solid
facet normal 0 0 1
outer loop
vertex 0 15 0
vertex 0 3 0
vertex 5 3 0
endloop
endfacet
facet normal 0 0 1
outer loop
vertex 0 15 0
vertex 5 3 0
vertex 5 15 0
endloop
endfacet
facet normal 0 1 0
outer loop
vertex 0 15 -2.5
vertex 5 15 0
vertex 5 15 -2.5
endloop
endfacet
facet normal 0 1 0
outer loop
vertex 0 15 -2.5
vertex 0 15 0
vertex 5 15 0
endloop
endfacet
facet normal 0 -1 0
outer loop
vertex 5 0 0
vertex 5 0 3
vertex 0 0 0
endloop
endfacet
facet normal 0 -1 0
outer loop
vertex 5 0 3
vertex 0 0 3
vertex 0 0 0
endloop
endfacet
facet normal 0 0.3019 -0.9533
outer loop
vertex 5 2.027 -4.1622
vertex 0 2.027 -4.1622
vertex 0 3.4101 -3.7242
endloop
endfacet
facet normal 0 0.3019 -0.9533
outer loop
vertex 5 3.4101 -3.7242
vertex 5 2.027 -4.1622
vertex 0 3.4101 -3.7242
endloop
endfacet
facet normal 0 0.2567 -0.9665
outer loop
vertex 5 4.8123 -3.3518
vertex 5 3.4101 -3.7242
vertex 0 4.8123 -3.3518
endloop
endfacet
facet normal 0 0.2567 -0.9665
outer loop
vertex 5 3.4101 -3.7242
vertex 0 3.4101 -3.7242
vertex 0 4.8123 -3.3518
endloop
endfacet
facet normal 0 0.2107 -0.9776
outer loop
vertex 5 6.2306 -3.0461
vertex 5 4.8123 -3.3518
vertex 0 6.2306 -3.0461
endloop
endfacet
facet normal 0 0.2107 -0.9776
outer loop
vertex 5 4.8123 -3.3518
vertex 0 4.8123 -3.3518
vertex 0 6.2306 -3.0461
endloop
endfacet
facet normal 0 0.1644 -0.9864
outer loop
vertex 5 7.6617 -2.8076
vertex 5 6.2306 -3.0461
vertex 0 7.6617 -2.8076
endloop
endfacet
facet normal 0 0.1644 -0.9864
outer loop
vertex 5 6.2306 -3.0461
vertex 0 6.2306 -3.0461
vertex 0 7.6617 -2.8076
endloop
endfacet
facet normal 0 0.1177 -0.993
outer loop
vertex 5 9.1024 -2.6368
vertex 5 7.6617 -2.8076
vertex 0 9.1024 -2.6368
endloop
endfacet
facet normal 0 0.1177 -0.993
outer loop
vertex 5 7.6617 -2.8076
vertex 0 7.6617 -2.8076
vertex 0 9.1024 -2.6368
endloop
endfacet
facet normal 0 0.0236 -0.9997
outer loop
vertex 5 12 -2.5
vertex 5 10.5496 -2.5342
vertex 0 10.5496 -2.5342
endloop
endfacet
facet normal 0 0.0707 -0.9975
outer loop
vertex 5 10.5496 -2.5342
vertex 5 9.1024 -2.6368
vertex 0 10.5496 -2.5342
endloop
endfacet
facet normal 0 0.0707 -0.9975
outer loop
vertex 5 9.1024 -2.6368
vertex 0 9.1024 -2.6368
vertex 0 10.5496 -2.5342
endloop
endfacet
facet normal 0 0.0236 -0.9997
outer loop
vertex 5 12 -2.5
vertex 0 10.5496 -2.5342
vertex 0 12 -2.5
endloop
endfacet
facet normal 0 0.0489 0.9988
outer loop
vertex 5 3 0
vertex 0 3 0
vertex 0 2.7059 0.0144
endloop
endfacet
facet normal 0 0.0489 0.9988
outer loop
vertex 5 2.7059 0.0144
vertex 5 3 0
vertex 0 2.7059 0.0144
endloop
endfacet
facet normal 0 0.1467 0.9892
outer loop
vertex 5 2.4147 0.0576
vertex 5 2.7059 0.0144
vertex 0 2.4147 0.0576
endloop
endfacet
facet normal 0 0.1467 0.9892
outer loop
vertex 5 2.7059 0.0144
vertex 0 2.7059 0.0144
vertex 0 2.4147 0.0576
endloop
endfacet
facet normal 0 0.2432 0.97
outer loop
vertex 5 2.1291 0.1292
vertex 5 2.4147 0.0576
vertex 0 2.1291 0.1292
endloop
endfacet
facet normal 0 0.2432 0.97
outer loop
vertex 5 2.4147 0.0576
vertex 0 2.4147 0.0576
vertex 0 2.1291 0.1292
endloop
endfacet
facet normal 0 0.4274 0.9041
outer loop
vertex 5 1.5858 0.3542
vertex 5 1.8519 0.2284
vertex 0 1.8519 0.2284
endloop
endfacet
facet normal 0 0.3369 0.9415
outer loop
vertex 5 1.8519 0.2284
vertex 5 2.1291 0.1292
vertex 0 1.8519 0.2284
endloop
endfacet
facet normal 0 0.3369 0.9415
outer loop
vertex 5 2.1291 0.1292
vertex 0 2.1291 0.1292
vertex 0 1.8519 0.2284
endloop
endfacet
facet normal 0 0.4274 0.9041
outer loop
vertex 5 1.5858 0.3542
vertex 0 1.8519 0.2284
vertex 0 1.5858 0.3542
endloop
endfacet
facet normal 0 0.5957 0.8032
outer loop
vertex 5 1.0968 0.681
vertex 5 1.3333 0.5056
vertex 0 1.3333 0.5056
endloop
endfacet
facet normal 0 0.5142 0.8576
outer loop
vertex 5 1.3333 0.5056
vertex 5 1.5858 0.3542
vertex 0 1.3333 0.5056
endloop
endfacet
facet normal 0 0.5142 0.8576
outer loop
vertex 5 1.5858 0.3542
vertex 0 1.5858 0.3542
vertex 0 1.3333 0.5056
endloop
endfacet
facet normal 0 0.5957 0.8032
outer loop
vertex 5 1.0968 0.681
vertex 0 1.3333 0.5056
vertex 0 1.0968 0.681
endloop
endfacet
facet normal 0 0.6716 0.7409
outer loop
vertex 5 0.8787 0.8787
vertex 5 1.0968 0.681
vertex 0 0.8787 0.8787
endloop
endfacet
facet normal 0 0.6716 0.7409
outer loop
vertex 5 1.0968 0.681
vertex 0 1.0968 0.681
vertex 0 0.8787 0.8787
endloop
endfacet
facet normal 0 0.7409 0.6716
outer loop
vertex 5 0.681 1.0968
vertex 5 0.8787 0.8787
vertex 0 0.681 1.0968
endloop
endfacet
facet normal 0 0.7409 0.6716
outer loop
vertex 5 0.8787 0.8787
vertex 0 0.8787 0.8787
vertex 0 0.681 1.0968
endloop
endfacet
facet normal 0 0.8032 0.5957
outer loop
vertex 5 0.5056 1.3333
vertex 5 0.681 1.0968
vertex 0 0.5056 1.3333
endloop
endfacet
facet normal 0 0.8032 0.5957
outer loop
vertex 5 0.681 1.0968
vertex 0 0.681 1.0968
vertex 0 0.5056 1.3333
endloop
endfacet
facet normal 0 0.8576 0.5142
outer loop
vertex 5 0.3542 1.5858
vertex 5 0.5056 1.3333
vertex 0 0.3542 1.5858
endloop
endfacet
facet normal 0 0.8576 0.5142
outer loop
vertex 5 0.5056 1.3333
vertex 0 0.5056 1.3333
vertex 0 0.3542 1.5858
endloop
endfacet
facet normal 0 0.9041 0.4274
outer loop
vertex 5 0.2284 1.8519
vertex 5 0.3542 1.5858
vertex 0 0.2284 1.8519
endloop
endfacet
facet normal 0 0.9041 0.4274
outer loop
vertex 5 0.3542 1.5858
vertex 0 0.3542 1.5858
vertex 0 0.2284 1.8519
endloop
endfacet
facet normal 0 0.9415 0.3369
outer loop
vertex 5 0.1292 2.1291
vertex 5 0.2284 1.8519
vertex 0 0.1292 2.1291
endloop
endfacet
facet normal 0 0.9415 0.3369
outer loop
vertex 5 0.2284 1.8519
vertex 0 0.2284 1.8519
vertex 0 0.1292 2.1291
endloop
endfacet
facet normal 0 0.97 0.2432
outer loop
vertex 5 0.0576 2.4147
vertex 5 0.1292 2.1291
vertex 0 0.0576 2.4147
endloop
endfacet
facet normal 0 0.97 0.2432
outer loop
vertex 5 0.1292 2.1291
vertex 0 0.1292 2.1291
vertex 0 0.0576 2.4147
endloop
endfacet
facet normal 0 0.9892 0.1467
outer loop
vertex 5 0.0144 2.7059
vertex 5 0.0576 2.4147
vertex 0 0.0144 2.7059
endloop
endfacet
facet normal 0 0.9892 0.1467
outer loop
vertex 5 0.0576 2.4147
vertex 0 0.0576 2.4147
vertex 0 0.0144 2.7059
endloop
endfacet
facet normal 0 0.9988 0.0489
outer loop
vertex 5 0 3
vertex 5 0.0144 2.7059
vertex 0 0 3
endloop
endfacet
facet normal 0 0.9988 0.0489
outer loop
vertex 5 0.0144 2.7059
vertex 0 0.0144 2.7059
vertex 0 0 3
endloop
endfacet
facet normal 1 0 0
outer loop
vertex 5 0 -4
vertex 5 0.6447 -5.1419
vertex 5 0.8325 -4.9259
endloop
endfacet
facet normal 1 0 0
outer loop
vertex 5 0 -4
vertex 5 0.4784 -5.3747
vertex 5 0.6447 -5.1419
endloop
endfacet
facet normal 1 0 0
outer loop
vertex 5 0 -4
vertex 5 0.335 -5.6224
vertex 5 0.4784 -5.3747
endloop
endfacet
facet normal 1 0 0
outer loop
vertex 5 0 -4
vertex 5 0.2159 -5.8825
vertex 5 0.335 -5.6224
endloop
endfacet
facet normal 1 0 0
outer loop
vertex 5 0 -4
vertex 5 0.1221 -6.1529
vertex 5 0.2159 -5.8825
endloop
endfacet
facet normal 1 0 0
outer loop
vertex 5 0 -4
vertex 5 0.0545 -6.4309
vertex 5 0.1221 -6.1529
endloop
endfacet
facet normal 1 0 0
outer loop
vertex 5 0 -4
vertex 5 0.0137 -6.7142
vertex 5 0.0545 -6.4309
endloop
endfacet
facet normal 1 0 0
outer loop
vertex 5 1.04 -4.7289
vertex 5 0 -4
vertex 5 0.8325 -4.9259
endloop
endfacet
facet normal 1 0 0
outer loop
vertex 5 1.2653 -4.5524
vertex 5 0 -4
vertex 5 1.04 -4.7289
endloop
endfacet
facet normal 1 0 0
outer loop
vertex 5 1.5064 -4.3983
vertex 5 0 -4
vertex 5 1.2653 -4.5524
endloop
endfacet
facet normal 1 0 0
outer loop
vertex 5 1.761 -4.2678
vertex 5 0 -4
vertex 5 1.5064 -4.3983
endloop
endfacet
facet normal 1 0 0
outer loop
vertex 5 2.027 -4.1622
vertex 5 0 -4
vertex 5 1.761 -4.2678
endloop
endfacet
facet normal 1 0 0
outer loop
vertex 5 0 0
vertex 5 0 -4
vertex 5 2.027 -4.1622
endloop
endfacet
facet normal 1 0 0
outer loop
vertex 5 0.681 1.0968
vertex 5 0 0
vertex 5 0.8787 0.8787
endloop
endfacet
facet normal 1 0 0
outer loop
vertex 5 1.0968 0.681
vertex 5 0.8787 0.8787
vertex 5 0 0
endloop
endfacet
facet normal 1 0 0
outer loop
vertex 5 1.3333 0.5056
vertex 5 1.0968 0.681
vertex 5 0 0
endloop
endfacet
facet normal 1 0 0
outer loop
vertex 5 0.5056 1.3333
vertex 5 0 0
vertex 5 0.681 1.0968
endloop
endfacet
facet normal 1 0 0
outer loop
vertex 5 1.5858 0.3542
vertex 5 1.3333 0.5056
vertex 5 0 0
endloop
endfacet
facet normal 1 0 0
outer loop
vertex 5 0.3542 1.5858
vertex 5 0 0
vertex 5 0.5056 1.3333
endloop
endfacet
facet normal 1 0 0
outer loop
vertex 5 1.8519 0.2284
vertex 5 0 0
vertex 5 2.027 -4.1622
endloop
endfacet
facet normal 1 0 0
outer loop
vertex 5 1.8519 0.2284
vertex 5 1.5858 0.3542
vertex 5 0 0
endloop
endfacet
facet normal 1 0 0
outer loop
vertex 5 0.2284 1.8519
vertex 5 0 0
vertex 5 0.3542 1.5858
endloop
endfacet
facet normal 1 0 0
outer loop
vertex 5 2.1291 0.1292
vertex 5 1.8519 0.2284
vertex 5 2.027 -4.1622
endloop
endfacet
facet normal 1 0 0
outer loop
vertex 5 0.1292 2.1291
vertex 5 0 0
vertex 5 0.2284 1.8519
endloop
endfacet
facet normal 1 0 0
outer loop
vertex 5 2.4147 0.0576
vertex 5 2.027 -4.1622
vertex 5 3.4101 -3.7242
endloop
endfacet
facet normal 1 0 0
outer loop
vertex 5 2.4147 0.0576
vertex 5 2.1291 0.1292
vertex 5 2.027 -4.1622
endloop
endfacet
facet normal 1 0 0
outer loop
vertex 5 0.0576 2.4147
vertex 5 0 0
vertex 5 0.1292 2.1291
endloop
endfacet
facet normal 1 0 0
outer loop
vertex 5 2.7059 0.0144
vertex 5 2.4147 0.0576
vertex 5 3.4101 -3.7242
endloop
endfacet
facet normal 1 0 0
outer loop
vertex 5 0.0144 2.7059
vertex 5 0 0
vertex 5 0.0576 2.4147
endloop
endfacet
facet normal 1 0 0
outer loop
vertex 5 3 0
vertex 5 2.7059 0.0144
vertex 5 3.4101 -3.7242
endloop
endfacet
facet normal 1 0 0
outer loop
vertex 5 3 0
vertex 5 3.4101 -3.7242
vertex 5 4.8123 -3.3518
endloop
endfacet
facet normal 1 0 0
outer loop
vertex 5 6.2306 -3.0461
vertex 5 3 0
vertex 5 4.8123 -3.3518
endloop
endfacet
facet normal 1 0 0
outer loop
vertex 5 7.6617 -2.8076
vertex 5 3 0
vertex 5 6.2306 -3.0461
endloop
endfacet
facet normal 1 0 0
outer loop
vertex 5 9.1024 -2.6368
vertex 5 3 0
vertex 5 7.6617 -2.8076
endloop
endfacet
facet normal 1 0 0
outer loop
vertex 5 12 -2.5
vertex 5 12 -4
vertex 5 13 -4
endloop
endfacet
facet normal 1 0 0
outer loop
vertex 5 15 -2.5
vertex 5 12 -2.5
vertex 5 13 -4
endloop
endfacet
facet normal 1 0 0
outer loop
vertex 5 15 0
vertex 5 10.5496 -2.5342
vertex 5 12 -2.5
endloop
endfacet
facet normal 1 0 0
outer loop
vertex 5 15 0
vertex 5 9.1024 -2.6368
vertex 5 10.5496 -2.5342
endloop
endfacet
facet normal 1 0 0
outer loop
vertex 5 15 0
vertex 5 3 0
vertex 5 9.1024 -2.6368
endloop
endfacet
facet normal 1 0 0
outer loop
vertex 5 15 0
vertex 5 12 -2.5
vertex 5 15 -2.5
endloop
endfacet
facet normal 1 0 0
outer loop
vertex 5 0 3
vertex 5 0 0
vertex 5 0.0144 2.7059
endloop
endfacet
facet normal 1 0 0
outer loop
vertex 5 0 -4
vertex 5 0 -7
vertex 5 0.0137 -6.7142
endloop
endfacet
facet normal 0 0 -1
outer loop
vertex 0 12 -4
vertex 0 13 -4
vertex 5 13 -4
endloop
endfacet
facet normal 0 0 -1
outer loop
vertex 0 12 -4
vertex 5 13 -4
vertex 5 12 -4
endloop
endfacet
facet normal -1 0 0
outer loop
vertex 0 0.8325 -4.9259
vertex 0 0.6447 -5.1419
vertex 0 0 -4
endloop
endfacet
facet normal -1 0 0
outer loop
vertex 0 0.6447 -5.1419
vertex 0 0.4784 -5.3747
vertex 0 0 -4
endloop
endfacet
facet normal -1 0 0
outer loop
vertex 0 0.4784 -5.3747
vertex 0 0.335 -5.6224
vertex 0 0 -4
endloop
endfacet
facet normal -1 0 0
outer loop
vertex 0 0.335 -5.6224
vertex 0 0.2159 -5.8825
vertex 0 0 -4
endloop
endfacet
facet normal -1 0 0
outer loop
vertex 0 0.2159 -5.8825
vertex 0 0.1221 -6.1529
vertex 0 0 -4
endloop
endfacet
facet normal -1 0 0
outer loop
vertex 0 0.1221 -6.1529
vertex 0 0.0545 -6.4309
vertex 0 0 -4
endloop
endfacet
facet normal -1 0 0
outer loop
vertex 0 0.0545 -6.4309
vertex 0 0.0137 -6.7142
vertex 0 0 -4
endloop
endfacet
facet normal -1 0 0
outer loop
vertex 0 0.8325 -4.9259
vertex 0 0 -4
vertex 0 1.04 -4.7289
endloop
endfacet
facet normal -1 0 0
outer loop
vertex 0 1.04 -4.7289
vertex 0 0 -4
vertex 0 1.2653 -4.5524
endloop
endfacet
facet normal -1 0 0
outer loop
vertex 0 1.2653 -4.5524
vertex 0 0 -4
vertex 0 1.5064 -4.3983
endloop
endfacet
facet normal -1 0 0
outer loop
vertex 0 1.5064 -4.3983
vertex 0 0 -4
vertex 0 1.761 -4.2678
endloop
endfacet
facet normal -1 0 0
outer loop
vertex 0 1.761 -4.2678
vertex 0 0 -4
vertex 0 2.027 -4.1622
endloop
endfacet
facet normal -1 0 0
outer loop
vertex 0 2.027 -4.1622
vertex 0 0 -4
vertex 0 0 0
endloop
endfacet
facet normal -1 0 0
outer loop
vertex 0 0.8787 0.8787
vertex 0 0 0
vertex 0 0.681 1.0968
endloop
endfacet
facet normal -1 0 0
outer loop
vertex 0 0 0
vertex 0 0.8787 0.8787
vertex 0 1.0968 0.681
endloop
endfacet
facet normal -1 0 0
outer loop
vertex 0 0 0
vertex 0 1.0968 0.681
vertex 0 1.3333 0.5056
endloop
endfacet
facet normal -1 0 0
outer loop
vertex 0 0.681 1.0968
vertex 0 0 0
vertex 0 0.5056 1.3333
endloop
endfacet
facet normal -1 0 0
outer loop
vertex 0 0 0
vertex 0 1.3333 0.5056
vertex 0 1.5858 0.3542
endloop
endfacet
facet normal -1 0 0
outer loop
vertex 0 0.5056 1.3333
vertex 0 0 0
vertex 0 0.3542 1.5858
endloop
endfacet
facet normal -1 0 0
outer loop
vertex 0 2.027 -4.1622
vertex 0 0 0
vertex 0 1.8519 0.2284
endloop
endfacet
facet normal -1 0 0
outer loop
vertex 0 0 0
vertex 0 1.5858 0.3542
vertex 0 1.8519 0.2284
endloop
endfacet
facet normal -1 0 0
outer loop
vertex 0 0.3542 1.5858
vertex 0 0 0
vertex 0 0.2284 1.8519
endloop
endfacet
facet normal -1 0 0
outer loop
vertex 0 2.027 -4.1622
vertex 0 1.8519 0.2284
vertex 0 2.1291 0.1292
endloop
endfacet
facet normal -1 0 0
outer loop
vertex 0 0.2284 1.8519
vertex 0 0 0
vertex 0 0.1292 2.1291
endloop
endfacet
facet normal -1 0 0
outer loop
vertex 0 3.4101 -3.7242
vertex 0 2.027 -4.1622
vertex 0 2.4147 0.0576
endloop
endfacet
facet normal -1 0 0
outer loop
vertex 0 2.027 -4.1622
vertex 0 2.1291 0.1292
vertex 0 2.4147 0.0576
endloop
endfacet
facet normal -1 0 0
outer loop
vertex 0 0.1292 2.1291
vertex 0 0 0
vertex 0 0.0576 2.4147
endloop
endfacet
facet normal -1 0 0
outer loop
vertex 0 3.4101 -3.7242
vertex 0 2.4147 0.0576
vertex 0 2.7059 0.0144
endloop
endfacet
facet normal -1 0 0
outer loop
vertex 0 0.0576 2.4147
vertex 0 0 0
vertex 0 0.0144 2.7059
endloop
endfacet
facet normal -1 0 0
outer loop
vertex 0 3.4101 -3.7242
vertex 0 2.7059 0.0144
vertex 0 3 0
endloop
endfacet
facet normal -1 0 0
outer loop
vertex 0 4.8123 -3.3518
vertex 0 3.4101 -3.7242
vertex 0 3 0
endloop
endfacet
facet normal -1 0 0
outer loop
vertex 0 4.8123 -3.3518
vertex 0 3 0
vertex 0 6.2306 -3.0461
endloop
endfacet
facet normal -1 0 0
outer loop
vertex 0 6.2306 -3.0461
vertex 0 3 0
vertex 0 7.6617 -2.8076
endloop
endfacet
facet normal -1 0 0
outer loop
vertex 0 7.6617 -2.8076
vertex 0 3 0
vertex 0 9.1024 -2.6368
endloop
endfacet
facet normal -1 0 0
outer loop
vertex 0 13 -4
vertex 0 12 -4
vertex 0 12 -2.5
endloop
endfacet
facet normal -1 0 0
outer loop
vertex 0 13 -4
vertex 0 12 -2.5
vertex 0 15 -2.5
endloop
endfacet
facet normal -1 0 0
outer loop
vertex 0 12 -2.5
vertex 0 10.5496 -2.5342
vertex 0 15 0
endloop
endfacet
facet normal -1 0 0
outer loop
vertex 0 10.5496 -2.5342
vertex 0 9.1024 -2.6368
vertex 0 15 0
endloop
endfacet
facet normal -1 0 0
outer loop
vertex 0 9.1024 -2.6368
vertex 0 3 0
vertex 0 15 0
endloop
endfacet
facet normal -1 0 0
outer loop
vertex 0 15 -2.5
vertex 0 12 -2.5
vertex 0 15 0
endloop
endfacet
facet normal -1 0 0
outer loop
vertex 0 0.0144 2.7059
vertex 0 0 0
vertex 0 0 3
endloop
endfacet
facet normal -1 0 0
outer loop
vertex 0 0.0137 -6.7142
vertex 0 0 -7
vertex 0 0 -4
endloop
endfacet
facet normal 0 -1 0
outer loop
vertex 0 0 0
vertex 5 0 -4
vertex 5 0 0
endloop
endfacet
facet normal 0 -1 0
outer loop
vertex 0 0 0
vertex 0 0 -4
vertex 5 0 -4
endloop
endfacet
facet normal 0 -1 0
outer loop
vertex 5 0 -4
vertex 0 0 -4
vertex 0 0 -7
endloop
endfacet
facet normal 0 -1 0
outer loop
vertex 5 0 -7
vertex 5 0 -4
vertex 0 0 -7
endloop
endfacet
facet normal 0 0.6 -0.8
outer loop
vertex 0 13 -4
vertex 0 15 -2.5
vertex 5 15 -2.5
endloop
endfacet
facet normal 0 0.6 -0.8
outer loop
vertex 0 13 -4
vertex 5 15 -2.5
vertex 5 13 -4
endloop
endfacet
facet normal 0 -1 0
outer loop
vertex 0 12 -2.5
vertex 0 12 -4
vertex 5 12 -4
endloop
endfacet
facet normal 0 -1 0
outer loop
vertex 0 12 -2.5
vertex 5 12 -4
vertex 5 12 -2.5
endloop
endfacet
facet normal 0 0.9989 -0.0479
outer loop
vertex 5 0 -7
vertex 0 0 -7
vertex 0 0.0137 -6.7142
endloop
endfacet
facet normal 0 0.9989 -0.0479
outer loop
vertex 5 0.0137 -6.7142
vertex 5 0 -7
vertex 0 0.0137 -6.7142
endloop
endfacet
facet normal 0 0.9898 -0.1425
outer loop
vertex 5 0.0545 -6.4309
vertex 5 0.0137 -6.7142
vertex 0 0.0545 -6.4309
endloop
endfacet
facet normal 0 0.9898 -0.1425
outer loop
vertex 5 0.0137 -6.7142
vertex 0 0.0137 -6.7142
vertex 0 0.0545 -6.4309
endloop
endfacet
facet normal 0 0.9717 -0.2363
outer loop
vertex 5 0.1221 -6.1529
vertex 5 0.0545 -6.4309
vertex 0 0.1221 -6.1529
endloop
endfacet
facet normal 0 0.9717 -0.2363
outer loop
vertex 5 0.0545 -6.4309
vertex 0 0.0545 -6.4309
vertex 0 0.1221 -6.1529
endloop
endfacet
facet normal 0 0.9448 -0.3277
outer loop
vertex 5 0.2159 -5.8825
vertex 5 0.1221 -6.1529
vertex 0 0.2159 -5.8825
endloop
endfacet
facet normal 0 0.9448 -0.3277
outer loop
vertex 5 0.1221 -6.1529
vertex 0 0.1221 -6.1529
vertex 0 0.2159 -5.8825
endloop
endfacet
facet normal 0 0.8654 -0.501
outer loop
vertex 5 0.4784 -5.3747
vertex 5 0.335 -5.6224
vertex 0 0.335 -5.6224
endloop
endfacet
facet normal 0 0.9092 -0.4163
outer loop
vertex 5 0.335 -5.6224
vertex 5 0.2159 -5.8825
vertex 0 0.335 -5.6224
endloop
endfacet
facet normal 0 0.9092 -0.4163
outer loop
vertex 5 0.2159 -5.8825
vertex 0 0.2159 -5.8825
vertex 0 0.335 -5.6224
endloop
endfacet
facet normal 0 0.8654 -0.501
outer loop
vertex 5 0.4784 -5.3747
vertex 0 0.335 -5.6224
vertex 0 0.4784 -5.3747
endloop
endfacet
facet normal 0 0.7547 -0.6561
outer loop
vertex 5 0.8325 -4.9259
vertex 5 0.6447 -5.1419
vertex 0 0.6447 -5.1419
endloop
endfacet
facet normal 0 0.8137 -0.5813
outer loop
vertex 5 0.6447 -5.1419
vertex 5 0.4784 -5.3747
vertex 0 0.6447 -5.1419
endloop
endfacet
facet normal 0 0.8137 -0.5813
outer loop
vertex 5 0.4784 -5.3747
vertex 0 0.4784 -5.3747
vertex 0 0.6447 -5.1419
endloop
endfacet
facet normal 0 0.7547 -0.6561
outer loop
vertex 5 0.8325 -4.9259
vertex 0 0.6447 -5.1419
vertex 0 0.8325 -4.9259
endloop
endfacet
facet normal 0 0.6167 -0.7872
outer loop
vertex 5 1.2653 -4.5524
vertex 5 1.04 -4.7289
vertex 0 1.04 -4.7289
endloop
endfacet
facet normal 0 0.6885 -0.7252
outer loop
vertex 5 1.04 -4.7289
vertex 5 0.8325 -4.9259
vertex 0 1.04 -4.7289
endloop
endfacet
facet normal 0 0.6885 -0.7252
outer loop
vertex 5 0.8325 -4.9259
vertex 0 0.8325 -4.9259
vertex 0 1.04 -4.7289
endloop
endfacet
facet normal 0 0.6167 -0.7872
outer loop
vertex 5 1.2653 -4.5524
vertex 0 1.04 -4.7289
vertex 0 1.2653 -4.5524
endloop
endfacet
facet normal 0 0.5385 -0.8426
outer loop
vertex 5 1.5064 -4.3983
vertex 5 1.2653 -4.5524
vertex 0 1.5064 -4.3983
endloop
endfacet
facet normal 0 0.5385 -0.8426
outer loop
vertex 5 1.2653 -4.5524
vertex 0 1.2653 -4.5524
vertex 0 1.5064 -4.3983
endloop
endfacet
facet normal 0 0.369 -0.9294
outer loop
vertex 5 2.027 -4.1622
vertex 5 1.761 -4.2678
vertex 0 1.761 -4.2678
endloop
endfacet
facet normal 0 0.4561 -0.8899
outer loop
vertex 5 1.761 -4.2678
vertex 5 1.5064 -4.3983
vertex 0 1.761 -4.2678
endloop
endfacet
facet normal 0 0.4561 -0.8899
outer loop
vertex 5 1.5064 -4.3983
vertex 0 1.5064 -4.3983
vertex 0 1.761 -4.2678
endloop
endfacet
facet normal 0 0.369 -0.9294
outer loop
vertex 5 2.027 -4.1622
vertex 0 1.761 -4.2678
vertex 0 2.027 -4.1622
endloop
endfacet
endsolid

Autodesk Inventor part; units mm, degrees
ref_plane "YZ Plane" through (0, 0, 0) normal (1, 0, 0) x (0, 1, 0)
ref_plane "XZ Plane" through (0, 0, 0) normal (0, 1, 0) x (-1, 0, 0)
ref_plane "XY Plane" through (0, 0, 0) normal (0, 0, 1) x (1, 0, 0)
sketch "Sketch1" plane through (0, 0, 0) normal (1, 0, 0) x (0, 1, 0)
  line L0 (3, 0) -> (15, 0)
  line L1 (15, 0) -> (15, -2.5)
  line L2 (15, -2.5) -> (13, -4)
  line L3 (13, -4) -> (12, -4)
  line L4 (12, -4) -> (12, -2.5)
  line L5 (0, -4) -> (0, 0)
  arc A0 (12, -2.5) -> (2.027, -4.1622) centre (12, -33.25) ccw
  line L6 (0, 3) -> (0, 0)
  arc A1 (0, 3) -> (3, 0) centre (3, 3) ccw
  line L7 (0, -4) -> (0, -7)
  arc A2 (2.027, -4.1622) -> (0, -7) centre (3, -7) ccw
  dimension "d0" = 12
  dimension "d1" = 4
  dimension "d2" = 1.5
  dimension "d3" = 3
  dimension "d4" = 2.5
  dimension "d5" = 1
  dimension "d15" = 3
  dimension "d17" = 3
  dimension "d18" = 3
extrude "Extrusion1" add sketch "Sketch1" along normal blind 5
properties part number "Clipje" material "ABS Plastic"
